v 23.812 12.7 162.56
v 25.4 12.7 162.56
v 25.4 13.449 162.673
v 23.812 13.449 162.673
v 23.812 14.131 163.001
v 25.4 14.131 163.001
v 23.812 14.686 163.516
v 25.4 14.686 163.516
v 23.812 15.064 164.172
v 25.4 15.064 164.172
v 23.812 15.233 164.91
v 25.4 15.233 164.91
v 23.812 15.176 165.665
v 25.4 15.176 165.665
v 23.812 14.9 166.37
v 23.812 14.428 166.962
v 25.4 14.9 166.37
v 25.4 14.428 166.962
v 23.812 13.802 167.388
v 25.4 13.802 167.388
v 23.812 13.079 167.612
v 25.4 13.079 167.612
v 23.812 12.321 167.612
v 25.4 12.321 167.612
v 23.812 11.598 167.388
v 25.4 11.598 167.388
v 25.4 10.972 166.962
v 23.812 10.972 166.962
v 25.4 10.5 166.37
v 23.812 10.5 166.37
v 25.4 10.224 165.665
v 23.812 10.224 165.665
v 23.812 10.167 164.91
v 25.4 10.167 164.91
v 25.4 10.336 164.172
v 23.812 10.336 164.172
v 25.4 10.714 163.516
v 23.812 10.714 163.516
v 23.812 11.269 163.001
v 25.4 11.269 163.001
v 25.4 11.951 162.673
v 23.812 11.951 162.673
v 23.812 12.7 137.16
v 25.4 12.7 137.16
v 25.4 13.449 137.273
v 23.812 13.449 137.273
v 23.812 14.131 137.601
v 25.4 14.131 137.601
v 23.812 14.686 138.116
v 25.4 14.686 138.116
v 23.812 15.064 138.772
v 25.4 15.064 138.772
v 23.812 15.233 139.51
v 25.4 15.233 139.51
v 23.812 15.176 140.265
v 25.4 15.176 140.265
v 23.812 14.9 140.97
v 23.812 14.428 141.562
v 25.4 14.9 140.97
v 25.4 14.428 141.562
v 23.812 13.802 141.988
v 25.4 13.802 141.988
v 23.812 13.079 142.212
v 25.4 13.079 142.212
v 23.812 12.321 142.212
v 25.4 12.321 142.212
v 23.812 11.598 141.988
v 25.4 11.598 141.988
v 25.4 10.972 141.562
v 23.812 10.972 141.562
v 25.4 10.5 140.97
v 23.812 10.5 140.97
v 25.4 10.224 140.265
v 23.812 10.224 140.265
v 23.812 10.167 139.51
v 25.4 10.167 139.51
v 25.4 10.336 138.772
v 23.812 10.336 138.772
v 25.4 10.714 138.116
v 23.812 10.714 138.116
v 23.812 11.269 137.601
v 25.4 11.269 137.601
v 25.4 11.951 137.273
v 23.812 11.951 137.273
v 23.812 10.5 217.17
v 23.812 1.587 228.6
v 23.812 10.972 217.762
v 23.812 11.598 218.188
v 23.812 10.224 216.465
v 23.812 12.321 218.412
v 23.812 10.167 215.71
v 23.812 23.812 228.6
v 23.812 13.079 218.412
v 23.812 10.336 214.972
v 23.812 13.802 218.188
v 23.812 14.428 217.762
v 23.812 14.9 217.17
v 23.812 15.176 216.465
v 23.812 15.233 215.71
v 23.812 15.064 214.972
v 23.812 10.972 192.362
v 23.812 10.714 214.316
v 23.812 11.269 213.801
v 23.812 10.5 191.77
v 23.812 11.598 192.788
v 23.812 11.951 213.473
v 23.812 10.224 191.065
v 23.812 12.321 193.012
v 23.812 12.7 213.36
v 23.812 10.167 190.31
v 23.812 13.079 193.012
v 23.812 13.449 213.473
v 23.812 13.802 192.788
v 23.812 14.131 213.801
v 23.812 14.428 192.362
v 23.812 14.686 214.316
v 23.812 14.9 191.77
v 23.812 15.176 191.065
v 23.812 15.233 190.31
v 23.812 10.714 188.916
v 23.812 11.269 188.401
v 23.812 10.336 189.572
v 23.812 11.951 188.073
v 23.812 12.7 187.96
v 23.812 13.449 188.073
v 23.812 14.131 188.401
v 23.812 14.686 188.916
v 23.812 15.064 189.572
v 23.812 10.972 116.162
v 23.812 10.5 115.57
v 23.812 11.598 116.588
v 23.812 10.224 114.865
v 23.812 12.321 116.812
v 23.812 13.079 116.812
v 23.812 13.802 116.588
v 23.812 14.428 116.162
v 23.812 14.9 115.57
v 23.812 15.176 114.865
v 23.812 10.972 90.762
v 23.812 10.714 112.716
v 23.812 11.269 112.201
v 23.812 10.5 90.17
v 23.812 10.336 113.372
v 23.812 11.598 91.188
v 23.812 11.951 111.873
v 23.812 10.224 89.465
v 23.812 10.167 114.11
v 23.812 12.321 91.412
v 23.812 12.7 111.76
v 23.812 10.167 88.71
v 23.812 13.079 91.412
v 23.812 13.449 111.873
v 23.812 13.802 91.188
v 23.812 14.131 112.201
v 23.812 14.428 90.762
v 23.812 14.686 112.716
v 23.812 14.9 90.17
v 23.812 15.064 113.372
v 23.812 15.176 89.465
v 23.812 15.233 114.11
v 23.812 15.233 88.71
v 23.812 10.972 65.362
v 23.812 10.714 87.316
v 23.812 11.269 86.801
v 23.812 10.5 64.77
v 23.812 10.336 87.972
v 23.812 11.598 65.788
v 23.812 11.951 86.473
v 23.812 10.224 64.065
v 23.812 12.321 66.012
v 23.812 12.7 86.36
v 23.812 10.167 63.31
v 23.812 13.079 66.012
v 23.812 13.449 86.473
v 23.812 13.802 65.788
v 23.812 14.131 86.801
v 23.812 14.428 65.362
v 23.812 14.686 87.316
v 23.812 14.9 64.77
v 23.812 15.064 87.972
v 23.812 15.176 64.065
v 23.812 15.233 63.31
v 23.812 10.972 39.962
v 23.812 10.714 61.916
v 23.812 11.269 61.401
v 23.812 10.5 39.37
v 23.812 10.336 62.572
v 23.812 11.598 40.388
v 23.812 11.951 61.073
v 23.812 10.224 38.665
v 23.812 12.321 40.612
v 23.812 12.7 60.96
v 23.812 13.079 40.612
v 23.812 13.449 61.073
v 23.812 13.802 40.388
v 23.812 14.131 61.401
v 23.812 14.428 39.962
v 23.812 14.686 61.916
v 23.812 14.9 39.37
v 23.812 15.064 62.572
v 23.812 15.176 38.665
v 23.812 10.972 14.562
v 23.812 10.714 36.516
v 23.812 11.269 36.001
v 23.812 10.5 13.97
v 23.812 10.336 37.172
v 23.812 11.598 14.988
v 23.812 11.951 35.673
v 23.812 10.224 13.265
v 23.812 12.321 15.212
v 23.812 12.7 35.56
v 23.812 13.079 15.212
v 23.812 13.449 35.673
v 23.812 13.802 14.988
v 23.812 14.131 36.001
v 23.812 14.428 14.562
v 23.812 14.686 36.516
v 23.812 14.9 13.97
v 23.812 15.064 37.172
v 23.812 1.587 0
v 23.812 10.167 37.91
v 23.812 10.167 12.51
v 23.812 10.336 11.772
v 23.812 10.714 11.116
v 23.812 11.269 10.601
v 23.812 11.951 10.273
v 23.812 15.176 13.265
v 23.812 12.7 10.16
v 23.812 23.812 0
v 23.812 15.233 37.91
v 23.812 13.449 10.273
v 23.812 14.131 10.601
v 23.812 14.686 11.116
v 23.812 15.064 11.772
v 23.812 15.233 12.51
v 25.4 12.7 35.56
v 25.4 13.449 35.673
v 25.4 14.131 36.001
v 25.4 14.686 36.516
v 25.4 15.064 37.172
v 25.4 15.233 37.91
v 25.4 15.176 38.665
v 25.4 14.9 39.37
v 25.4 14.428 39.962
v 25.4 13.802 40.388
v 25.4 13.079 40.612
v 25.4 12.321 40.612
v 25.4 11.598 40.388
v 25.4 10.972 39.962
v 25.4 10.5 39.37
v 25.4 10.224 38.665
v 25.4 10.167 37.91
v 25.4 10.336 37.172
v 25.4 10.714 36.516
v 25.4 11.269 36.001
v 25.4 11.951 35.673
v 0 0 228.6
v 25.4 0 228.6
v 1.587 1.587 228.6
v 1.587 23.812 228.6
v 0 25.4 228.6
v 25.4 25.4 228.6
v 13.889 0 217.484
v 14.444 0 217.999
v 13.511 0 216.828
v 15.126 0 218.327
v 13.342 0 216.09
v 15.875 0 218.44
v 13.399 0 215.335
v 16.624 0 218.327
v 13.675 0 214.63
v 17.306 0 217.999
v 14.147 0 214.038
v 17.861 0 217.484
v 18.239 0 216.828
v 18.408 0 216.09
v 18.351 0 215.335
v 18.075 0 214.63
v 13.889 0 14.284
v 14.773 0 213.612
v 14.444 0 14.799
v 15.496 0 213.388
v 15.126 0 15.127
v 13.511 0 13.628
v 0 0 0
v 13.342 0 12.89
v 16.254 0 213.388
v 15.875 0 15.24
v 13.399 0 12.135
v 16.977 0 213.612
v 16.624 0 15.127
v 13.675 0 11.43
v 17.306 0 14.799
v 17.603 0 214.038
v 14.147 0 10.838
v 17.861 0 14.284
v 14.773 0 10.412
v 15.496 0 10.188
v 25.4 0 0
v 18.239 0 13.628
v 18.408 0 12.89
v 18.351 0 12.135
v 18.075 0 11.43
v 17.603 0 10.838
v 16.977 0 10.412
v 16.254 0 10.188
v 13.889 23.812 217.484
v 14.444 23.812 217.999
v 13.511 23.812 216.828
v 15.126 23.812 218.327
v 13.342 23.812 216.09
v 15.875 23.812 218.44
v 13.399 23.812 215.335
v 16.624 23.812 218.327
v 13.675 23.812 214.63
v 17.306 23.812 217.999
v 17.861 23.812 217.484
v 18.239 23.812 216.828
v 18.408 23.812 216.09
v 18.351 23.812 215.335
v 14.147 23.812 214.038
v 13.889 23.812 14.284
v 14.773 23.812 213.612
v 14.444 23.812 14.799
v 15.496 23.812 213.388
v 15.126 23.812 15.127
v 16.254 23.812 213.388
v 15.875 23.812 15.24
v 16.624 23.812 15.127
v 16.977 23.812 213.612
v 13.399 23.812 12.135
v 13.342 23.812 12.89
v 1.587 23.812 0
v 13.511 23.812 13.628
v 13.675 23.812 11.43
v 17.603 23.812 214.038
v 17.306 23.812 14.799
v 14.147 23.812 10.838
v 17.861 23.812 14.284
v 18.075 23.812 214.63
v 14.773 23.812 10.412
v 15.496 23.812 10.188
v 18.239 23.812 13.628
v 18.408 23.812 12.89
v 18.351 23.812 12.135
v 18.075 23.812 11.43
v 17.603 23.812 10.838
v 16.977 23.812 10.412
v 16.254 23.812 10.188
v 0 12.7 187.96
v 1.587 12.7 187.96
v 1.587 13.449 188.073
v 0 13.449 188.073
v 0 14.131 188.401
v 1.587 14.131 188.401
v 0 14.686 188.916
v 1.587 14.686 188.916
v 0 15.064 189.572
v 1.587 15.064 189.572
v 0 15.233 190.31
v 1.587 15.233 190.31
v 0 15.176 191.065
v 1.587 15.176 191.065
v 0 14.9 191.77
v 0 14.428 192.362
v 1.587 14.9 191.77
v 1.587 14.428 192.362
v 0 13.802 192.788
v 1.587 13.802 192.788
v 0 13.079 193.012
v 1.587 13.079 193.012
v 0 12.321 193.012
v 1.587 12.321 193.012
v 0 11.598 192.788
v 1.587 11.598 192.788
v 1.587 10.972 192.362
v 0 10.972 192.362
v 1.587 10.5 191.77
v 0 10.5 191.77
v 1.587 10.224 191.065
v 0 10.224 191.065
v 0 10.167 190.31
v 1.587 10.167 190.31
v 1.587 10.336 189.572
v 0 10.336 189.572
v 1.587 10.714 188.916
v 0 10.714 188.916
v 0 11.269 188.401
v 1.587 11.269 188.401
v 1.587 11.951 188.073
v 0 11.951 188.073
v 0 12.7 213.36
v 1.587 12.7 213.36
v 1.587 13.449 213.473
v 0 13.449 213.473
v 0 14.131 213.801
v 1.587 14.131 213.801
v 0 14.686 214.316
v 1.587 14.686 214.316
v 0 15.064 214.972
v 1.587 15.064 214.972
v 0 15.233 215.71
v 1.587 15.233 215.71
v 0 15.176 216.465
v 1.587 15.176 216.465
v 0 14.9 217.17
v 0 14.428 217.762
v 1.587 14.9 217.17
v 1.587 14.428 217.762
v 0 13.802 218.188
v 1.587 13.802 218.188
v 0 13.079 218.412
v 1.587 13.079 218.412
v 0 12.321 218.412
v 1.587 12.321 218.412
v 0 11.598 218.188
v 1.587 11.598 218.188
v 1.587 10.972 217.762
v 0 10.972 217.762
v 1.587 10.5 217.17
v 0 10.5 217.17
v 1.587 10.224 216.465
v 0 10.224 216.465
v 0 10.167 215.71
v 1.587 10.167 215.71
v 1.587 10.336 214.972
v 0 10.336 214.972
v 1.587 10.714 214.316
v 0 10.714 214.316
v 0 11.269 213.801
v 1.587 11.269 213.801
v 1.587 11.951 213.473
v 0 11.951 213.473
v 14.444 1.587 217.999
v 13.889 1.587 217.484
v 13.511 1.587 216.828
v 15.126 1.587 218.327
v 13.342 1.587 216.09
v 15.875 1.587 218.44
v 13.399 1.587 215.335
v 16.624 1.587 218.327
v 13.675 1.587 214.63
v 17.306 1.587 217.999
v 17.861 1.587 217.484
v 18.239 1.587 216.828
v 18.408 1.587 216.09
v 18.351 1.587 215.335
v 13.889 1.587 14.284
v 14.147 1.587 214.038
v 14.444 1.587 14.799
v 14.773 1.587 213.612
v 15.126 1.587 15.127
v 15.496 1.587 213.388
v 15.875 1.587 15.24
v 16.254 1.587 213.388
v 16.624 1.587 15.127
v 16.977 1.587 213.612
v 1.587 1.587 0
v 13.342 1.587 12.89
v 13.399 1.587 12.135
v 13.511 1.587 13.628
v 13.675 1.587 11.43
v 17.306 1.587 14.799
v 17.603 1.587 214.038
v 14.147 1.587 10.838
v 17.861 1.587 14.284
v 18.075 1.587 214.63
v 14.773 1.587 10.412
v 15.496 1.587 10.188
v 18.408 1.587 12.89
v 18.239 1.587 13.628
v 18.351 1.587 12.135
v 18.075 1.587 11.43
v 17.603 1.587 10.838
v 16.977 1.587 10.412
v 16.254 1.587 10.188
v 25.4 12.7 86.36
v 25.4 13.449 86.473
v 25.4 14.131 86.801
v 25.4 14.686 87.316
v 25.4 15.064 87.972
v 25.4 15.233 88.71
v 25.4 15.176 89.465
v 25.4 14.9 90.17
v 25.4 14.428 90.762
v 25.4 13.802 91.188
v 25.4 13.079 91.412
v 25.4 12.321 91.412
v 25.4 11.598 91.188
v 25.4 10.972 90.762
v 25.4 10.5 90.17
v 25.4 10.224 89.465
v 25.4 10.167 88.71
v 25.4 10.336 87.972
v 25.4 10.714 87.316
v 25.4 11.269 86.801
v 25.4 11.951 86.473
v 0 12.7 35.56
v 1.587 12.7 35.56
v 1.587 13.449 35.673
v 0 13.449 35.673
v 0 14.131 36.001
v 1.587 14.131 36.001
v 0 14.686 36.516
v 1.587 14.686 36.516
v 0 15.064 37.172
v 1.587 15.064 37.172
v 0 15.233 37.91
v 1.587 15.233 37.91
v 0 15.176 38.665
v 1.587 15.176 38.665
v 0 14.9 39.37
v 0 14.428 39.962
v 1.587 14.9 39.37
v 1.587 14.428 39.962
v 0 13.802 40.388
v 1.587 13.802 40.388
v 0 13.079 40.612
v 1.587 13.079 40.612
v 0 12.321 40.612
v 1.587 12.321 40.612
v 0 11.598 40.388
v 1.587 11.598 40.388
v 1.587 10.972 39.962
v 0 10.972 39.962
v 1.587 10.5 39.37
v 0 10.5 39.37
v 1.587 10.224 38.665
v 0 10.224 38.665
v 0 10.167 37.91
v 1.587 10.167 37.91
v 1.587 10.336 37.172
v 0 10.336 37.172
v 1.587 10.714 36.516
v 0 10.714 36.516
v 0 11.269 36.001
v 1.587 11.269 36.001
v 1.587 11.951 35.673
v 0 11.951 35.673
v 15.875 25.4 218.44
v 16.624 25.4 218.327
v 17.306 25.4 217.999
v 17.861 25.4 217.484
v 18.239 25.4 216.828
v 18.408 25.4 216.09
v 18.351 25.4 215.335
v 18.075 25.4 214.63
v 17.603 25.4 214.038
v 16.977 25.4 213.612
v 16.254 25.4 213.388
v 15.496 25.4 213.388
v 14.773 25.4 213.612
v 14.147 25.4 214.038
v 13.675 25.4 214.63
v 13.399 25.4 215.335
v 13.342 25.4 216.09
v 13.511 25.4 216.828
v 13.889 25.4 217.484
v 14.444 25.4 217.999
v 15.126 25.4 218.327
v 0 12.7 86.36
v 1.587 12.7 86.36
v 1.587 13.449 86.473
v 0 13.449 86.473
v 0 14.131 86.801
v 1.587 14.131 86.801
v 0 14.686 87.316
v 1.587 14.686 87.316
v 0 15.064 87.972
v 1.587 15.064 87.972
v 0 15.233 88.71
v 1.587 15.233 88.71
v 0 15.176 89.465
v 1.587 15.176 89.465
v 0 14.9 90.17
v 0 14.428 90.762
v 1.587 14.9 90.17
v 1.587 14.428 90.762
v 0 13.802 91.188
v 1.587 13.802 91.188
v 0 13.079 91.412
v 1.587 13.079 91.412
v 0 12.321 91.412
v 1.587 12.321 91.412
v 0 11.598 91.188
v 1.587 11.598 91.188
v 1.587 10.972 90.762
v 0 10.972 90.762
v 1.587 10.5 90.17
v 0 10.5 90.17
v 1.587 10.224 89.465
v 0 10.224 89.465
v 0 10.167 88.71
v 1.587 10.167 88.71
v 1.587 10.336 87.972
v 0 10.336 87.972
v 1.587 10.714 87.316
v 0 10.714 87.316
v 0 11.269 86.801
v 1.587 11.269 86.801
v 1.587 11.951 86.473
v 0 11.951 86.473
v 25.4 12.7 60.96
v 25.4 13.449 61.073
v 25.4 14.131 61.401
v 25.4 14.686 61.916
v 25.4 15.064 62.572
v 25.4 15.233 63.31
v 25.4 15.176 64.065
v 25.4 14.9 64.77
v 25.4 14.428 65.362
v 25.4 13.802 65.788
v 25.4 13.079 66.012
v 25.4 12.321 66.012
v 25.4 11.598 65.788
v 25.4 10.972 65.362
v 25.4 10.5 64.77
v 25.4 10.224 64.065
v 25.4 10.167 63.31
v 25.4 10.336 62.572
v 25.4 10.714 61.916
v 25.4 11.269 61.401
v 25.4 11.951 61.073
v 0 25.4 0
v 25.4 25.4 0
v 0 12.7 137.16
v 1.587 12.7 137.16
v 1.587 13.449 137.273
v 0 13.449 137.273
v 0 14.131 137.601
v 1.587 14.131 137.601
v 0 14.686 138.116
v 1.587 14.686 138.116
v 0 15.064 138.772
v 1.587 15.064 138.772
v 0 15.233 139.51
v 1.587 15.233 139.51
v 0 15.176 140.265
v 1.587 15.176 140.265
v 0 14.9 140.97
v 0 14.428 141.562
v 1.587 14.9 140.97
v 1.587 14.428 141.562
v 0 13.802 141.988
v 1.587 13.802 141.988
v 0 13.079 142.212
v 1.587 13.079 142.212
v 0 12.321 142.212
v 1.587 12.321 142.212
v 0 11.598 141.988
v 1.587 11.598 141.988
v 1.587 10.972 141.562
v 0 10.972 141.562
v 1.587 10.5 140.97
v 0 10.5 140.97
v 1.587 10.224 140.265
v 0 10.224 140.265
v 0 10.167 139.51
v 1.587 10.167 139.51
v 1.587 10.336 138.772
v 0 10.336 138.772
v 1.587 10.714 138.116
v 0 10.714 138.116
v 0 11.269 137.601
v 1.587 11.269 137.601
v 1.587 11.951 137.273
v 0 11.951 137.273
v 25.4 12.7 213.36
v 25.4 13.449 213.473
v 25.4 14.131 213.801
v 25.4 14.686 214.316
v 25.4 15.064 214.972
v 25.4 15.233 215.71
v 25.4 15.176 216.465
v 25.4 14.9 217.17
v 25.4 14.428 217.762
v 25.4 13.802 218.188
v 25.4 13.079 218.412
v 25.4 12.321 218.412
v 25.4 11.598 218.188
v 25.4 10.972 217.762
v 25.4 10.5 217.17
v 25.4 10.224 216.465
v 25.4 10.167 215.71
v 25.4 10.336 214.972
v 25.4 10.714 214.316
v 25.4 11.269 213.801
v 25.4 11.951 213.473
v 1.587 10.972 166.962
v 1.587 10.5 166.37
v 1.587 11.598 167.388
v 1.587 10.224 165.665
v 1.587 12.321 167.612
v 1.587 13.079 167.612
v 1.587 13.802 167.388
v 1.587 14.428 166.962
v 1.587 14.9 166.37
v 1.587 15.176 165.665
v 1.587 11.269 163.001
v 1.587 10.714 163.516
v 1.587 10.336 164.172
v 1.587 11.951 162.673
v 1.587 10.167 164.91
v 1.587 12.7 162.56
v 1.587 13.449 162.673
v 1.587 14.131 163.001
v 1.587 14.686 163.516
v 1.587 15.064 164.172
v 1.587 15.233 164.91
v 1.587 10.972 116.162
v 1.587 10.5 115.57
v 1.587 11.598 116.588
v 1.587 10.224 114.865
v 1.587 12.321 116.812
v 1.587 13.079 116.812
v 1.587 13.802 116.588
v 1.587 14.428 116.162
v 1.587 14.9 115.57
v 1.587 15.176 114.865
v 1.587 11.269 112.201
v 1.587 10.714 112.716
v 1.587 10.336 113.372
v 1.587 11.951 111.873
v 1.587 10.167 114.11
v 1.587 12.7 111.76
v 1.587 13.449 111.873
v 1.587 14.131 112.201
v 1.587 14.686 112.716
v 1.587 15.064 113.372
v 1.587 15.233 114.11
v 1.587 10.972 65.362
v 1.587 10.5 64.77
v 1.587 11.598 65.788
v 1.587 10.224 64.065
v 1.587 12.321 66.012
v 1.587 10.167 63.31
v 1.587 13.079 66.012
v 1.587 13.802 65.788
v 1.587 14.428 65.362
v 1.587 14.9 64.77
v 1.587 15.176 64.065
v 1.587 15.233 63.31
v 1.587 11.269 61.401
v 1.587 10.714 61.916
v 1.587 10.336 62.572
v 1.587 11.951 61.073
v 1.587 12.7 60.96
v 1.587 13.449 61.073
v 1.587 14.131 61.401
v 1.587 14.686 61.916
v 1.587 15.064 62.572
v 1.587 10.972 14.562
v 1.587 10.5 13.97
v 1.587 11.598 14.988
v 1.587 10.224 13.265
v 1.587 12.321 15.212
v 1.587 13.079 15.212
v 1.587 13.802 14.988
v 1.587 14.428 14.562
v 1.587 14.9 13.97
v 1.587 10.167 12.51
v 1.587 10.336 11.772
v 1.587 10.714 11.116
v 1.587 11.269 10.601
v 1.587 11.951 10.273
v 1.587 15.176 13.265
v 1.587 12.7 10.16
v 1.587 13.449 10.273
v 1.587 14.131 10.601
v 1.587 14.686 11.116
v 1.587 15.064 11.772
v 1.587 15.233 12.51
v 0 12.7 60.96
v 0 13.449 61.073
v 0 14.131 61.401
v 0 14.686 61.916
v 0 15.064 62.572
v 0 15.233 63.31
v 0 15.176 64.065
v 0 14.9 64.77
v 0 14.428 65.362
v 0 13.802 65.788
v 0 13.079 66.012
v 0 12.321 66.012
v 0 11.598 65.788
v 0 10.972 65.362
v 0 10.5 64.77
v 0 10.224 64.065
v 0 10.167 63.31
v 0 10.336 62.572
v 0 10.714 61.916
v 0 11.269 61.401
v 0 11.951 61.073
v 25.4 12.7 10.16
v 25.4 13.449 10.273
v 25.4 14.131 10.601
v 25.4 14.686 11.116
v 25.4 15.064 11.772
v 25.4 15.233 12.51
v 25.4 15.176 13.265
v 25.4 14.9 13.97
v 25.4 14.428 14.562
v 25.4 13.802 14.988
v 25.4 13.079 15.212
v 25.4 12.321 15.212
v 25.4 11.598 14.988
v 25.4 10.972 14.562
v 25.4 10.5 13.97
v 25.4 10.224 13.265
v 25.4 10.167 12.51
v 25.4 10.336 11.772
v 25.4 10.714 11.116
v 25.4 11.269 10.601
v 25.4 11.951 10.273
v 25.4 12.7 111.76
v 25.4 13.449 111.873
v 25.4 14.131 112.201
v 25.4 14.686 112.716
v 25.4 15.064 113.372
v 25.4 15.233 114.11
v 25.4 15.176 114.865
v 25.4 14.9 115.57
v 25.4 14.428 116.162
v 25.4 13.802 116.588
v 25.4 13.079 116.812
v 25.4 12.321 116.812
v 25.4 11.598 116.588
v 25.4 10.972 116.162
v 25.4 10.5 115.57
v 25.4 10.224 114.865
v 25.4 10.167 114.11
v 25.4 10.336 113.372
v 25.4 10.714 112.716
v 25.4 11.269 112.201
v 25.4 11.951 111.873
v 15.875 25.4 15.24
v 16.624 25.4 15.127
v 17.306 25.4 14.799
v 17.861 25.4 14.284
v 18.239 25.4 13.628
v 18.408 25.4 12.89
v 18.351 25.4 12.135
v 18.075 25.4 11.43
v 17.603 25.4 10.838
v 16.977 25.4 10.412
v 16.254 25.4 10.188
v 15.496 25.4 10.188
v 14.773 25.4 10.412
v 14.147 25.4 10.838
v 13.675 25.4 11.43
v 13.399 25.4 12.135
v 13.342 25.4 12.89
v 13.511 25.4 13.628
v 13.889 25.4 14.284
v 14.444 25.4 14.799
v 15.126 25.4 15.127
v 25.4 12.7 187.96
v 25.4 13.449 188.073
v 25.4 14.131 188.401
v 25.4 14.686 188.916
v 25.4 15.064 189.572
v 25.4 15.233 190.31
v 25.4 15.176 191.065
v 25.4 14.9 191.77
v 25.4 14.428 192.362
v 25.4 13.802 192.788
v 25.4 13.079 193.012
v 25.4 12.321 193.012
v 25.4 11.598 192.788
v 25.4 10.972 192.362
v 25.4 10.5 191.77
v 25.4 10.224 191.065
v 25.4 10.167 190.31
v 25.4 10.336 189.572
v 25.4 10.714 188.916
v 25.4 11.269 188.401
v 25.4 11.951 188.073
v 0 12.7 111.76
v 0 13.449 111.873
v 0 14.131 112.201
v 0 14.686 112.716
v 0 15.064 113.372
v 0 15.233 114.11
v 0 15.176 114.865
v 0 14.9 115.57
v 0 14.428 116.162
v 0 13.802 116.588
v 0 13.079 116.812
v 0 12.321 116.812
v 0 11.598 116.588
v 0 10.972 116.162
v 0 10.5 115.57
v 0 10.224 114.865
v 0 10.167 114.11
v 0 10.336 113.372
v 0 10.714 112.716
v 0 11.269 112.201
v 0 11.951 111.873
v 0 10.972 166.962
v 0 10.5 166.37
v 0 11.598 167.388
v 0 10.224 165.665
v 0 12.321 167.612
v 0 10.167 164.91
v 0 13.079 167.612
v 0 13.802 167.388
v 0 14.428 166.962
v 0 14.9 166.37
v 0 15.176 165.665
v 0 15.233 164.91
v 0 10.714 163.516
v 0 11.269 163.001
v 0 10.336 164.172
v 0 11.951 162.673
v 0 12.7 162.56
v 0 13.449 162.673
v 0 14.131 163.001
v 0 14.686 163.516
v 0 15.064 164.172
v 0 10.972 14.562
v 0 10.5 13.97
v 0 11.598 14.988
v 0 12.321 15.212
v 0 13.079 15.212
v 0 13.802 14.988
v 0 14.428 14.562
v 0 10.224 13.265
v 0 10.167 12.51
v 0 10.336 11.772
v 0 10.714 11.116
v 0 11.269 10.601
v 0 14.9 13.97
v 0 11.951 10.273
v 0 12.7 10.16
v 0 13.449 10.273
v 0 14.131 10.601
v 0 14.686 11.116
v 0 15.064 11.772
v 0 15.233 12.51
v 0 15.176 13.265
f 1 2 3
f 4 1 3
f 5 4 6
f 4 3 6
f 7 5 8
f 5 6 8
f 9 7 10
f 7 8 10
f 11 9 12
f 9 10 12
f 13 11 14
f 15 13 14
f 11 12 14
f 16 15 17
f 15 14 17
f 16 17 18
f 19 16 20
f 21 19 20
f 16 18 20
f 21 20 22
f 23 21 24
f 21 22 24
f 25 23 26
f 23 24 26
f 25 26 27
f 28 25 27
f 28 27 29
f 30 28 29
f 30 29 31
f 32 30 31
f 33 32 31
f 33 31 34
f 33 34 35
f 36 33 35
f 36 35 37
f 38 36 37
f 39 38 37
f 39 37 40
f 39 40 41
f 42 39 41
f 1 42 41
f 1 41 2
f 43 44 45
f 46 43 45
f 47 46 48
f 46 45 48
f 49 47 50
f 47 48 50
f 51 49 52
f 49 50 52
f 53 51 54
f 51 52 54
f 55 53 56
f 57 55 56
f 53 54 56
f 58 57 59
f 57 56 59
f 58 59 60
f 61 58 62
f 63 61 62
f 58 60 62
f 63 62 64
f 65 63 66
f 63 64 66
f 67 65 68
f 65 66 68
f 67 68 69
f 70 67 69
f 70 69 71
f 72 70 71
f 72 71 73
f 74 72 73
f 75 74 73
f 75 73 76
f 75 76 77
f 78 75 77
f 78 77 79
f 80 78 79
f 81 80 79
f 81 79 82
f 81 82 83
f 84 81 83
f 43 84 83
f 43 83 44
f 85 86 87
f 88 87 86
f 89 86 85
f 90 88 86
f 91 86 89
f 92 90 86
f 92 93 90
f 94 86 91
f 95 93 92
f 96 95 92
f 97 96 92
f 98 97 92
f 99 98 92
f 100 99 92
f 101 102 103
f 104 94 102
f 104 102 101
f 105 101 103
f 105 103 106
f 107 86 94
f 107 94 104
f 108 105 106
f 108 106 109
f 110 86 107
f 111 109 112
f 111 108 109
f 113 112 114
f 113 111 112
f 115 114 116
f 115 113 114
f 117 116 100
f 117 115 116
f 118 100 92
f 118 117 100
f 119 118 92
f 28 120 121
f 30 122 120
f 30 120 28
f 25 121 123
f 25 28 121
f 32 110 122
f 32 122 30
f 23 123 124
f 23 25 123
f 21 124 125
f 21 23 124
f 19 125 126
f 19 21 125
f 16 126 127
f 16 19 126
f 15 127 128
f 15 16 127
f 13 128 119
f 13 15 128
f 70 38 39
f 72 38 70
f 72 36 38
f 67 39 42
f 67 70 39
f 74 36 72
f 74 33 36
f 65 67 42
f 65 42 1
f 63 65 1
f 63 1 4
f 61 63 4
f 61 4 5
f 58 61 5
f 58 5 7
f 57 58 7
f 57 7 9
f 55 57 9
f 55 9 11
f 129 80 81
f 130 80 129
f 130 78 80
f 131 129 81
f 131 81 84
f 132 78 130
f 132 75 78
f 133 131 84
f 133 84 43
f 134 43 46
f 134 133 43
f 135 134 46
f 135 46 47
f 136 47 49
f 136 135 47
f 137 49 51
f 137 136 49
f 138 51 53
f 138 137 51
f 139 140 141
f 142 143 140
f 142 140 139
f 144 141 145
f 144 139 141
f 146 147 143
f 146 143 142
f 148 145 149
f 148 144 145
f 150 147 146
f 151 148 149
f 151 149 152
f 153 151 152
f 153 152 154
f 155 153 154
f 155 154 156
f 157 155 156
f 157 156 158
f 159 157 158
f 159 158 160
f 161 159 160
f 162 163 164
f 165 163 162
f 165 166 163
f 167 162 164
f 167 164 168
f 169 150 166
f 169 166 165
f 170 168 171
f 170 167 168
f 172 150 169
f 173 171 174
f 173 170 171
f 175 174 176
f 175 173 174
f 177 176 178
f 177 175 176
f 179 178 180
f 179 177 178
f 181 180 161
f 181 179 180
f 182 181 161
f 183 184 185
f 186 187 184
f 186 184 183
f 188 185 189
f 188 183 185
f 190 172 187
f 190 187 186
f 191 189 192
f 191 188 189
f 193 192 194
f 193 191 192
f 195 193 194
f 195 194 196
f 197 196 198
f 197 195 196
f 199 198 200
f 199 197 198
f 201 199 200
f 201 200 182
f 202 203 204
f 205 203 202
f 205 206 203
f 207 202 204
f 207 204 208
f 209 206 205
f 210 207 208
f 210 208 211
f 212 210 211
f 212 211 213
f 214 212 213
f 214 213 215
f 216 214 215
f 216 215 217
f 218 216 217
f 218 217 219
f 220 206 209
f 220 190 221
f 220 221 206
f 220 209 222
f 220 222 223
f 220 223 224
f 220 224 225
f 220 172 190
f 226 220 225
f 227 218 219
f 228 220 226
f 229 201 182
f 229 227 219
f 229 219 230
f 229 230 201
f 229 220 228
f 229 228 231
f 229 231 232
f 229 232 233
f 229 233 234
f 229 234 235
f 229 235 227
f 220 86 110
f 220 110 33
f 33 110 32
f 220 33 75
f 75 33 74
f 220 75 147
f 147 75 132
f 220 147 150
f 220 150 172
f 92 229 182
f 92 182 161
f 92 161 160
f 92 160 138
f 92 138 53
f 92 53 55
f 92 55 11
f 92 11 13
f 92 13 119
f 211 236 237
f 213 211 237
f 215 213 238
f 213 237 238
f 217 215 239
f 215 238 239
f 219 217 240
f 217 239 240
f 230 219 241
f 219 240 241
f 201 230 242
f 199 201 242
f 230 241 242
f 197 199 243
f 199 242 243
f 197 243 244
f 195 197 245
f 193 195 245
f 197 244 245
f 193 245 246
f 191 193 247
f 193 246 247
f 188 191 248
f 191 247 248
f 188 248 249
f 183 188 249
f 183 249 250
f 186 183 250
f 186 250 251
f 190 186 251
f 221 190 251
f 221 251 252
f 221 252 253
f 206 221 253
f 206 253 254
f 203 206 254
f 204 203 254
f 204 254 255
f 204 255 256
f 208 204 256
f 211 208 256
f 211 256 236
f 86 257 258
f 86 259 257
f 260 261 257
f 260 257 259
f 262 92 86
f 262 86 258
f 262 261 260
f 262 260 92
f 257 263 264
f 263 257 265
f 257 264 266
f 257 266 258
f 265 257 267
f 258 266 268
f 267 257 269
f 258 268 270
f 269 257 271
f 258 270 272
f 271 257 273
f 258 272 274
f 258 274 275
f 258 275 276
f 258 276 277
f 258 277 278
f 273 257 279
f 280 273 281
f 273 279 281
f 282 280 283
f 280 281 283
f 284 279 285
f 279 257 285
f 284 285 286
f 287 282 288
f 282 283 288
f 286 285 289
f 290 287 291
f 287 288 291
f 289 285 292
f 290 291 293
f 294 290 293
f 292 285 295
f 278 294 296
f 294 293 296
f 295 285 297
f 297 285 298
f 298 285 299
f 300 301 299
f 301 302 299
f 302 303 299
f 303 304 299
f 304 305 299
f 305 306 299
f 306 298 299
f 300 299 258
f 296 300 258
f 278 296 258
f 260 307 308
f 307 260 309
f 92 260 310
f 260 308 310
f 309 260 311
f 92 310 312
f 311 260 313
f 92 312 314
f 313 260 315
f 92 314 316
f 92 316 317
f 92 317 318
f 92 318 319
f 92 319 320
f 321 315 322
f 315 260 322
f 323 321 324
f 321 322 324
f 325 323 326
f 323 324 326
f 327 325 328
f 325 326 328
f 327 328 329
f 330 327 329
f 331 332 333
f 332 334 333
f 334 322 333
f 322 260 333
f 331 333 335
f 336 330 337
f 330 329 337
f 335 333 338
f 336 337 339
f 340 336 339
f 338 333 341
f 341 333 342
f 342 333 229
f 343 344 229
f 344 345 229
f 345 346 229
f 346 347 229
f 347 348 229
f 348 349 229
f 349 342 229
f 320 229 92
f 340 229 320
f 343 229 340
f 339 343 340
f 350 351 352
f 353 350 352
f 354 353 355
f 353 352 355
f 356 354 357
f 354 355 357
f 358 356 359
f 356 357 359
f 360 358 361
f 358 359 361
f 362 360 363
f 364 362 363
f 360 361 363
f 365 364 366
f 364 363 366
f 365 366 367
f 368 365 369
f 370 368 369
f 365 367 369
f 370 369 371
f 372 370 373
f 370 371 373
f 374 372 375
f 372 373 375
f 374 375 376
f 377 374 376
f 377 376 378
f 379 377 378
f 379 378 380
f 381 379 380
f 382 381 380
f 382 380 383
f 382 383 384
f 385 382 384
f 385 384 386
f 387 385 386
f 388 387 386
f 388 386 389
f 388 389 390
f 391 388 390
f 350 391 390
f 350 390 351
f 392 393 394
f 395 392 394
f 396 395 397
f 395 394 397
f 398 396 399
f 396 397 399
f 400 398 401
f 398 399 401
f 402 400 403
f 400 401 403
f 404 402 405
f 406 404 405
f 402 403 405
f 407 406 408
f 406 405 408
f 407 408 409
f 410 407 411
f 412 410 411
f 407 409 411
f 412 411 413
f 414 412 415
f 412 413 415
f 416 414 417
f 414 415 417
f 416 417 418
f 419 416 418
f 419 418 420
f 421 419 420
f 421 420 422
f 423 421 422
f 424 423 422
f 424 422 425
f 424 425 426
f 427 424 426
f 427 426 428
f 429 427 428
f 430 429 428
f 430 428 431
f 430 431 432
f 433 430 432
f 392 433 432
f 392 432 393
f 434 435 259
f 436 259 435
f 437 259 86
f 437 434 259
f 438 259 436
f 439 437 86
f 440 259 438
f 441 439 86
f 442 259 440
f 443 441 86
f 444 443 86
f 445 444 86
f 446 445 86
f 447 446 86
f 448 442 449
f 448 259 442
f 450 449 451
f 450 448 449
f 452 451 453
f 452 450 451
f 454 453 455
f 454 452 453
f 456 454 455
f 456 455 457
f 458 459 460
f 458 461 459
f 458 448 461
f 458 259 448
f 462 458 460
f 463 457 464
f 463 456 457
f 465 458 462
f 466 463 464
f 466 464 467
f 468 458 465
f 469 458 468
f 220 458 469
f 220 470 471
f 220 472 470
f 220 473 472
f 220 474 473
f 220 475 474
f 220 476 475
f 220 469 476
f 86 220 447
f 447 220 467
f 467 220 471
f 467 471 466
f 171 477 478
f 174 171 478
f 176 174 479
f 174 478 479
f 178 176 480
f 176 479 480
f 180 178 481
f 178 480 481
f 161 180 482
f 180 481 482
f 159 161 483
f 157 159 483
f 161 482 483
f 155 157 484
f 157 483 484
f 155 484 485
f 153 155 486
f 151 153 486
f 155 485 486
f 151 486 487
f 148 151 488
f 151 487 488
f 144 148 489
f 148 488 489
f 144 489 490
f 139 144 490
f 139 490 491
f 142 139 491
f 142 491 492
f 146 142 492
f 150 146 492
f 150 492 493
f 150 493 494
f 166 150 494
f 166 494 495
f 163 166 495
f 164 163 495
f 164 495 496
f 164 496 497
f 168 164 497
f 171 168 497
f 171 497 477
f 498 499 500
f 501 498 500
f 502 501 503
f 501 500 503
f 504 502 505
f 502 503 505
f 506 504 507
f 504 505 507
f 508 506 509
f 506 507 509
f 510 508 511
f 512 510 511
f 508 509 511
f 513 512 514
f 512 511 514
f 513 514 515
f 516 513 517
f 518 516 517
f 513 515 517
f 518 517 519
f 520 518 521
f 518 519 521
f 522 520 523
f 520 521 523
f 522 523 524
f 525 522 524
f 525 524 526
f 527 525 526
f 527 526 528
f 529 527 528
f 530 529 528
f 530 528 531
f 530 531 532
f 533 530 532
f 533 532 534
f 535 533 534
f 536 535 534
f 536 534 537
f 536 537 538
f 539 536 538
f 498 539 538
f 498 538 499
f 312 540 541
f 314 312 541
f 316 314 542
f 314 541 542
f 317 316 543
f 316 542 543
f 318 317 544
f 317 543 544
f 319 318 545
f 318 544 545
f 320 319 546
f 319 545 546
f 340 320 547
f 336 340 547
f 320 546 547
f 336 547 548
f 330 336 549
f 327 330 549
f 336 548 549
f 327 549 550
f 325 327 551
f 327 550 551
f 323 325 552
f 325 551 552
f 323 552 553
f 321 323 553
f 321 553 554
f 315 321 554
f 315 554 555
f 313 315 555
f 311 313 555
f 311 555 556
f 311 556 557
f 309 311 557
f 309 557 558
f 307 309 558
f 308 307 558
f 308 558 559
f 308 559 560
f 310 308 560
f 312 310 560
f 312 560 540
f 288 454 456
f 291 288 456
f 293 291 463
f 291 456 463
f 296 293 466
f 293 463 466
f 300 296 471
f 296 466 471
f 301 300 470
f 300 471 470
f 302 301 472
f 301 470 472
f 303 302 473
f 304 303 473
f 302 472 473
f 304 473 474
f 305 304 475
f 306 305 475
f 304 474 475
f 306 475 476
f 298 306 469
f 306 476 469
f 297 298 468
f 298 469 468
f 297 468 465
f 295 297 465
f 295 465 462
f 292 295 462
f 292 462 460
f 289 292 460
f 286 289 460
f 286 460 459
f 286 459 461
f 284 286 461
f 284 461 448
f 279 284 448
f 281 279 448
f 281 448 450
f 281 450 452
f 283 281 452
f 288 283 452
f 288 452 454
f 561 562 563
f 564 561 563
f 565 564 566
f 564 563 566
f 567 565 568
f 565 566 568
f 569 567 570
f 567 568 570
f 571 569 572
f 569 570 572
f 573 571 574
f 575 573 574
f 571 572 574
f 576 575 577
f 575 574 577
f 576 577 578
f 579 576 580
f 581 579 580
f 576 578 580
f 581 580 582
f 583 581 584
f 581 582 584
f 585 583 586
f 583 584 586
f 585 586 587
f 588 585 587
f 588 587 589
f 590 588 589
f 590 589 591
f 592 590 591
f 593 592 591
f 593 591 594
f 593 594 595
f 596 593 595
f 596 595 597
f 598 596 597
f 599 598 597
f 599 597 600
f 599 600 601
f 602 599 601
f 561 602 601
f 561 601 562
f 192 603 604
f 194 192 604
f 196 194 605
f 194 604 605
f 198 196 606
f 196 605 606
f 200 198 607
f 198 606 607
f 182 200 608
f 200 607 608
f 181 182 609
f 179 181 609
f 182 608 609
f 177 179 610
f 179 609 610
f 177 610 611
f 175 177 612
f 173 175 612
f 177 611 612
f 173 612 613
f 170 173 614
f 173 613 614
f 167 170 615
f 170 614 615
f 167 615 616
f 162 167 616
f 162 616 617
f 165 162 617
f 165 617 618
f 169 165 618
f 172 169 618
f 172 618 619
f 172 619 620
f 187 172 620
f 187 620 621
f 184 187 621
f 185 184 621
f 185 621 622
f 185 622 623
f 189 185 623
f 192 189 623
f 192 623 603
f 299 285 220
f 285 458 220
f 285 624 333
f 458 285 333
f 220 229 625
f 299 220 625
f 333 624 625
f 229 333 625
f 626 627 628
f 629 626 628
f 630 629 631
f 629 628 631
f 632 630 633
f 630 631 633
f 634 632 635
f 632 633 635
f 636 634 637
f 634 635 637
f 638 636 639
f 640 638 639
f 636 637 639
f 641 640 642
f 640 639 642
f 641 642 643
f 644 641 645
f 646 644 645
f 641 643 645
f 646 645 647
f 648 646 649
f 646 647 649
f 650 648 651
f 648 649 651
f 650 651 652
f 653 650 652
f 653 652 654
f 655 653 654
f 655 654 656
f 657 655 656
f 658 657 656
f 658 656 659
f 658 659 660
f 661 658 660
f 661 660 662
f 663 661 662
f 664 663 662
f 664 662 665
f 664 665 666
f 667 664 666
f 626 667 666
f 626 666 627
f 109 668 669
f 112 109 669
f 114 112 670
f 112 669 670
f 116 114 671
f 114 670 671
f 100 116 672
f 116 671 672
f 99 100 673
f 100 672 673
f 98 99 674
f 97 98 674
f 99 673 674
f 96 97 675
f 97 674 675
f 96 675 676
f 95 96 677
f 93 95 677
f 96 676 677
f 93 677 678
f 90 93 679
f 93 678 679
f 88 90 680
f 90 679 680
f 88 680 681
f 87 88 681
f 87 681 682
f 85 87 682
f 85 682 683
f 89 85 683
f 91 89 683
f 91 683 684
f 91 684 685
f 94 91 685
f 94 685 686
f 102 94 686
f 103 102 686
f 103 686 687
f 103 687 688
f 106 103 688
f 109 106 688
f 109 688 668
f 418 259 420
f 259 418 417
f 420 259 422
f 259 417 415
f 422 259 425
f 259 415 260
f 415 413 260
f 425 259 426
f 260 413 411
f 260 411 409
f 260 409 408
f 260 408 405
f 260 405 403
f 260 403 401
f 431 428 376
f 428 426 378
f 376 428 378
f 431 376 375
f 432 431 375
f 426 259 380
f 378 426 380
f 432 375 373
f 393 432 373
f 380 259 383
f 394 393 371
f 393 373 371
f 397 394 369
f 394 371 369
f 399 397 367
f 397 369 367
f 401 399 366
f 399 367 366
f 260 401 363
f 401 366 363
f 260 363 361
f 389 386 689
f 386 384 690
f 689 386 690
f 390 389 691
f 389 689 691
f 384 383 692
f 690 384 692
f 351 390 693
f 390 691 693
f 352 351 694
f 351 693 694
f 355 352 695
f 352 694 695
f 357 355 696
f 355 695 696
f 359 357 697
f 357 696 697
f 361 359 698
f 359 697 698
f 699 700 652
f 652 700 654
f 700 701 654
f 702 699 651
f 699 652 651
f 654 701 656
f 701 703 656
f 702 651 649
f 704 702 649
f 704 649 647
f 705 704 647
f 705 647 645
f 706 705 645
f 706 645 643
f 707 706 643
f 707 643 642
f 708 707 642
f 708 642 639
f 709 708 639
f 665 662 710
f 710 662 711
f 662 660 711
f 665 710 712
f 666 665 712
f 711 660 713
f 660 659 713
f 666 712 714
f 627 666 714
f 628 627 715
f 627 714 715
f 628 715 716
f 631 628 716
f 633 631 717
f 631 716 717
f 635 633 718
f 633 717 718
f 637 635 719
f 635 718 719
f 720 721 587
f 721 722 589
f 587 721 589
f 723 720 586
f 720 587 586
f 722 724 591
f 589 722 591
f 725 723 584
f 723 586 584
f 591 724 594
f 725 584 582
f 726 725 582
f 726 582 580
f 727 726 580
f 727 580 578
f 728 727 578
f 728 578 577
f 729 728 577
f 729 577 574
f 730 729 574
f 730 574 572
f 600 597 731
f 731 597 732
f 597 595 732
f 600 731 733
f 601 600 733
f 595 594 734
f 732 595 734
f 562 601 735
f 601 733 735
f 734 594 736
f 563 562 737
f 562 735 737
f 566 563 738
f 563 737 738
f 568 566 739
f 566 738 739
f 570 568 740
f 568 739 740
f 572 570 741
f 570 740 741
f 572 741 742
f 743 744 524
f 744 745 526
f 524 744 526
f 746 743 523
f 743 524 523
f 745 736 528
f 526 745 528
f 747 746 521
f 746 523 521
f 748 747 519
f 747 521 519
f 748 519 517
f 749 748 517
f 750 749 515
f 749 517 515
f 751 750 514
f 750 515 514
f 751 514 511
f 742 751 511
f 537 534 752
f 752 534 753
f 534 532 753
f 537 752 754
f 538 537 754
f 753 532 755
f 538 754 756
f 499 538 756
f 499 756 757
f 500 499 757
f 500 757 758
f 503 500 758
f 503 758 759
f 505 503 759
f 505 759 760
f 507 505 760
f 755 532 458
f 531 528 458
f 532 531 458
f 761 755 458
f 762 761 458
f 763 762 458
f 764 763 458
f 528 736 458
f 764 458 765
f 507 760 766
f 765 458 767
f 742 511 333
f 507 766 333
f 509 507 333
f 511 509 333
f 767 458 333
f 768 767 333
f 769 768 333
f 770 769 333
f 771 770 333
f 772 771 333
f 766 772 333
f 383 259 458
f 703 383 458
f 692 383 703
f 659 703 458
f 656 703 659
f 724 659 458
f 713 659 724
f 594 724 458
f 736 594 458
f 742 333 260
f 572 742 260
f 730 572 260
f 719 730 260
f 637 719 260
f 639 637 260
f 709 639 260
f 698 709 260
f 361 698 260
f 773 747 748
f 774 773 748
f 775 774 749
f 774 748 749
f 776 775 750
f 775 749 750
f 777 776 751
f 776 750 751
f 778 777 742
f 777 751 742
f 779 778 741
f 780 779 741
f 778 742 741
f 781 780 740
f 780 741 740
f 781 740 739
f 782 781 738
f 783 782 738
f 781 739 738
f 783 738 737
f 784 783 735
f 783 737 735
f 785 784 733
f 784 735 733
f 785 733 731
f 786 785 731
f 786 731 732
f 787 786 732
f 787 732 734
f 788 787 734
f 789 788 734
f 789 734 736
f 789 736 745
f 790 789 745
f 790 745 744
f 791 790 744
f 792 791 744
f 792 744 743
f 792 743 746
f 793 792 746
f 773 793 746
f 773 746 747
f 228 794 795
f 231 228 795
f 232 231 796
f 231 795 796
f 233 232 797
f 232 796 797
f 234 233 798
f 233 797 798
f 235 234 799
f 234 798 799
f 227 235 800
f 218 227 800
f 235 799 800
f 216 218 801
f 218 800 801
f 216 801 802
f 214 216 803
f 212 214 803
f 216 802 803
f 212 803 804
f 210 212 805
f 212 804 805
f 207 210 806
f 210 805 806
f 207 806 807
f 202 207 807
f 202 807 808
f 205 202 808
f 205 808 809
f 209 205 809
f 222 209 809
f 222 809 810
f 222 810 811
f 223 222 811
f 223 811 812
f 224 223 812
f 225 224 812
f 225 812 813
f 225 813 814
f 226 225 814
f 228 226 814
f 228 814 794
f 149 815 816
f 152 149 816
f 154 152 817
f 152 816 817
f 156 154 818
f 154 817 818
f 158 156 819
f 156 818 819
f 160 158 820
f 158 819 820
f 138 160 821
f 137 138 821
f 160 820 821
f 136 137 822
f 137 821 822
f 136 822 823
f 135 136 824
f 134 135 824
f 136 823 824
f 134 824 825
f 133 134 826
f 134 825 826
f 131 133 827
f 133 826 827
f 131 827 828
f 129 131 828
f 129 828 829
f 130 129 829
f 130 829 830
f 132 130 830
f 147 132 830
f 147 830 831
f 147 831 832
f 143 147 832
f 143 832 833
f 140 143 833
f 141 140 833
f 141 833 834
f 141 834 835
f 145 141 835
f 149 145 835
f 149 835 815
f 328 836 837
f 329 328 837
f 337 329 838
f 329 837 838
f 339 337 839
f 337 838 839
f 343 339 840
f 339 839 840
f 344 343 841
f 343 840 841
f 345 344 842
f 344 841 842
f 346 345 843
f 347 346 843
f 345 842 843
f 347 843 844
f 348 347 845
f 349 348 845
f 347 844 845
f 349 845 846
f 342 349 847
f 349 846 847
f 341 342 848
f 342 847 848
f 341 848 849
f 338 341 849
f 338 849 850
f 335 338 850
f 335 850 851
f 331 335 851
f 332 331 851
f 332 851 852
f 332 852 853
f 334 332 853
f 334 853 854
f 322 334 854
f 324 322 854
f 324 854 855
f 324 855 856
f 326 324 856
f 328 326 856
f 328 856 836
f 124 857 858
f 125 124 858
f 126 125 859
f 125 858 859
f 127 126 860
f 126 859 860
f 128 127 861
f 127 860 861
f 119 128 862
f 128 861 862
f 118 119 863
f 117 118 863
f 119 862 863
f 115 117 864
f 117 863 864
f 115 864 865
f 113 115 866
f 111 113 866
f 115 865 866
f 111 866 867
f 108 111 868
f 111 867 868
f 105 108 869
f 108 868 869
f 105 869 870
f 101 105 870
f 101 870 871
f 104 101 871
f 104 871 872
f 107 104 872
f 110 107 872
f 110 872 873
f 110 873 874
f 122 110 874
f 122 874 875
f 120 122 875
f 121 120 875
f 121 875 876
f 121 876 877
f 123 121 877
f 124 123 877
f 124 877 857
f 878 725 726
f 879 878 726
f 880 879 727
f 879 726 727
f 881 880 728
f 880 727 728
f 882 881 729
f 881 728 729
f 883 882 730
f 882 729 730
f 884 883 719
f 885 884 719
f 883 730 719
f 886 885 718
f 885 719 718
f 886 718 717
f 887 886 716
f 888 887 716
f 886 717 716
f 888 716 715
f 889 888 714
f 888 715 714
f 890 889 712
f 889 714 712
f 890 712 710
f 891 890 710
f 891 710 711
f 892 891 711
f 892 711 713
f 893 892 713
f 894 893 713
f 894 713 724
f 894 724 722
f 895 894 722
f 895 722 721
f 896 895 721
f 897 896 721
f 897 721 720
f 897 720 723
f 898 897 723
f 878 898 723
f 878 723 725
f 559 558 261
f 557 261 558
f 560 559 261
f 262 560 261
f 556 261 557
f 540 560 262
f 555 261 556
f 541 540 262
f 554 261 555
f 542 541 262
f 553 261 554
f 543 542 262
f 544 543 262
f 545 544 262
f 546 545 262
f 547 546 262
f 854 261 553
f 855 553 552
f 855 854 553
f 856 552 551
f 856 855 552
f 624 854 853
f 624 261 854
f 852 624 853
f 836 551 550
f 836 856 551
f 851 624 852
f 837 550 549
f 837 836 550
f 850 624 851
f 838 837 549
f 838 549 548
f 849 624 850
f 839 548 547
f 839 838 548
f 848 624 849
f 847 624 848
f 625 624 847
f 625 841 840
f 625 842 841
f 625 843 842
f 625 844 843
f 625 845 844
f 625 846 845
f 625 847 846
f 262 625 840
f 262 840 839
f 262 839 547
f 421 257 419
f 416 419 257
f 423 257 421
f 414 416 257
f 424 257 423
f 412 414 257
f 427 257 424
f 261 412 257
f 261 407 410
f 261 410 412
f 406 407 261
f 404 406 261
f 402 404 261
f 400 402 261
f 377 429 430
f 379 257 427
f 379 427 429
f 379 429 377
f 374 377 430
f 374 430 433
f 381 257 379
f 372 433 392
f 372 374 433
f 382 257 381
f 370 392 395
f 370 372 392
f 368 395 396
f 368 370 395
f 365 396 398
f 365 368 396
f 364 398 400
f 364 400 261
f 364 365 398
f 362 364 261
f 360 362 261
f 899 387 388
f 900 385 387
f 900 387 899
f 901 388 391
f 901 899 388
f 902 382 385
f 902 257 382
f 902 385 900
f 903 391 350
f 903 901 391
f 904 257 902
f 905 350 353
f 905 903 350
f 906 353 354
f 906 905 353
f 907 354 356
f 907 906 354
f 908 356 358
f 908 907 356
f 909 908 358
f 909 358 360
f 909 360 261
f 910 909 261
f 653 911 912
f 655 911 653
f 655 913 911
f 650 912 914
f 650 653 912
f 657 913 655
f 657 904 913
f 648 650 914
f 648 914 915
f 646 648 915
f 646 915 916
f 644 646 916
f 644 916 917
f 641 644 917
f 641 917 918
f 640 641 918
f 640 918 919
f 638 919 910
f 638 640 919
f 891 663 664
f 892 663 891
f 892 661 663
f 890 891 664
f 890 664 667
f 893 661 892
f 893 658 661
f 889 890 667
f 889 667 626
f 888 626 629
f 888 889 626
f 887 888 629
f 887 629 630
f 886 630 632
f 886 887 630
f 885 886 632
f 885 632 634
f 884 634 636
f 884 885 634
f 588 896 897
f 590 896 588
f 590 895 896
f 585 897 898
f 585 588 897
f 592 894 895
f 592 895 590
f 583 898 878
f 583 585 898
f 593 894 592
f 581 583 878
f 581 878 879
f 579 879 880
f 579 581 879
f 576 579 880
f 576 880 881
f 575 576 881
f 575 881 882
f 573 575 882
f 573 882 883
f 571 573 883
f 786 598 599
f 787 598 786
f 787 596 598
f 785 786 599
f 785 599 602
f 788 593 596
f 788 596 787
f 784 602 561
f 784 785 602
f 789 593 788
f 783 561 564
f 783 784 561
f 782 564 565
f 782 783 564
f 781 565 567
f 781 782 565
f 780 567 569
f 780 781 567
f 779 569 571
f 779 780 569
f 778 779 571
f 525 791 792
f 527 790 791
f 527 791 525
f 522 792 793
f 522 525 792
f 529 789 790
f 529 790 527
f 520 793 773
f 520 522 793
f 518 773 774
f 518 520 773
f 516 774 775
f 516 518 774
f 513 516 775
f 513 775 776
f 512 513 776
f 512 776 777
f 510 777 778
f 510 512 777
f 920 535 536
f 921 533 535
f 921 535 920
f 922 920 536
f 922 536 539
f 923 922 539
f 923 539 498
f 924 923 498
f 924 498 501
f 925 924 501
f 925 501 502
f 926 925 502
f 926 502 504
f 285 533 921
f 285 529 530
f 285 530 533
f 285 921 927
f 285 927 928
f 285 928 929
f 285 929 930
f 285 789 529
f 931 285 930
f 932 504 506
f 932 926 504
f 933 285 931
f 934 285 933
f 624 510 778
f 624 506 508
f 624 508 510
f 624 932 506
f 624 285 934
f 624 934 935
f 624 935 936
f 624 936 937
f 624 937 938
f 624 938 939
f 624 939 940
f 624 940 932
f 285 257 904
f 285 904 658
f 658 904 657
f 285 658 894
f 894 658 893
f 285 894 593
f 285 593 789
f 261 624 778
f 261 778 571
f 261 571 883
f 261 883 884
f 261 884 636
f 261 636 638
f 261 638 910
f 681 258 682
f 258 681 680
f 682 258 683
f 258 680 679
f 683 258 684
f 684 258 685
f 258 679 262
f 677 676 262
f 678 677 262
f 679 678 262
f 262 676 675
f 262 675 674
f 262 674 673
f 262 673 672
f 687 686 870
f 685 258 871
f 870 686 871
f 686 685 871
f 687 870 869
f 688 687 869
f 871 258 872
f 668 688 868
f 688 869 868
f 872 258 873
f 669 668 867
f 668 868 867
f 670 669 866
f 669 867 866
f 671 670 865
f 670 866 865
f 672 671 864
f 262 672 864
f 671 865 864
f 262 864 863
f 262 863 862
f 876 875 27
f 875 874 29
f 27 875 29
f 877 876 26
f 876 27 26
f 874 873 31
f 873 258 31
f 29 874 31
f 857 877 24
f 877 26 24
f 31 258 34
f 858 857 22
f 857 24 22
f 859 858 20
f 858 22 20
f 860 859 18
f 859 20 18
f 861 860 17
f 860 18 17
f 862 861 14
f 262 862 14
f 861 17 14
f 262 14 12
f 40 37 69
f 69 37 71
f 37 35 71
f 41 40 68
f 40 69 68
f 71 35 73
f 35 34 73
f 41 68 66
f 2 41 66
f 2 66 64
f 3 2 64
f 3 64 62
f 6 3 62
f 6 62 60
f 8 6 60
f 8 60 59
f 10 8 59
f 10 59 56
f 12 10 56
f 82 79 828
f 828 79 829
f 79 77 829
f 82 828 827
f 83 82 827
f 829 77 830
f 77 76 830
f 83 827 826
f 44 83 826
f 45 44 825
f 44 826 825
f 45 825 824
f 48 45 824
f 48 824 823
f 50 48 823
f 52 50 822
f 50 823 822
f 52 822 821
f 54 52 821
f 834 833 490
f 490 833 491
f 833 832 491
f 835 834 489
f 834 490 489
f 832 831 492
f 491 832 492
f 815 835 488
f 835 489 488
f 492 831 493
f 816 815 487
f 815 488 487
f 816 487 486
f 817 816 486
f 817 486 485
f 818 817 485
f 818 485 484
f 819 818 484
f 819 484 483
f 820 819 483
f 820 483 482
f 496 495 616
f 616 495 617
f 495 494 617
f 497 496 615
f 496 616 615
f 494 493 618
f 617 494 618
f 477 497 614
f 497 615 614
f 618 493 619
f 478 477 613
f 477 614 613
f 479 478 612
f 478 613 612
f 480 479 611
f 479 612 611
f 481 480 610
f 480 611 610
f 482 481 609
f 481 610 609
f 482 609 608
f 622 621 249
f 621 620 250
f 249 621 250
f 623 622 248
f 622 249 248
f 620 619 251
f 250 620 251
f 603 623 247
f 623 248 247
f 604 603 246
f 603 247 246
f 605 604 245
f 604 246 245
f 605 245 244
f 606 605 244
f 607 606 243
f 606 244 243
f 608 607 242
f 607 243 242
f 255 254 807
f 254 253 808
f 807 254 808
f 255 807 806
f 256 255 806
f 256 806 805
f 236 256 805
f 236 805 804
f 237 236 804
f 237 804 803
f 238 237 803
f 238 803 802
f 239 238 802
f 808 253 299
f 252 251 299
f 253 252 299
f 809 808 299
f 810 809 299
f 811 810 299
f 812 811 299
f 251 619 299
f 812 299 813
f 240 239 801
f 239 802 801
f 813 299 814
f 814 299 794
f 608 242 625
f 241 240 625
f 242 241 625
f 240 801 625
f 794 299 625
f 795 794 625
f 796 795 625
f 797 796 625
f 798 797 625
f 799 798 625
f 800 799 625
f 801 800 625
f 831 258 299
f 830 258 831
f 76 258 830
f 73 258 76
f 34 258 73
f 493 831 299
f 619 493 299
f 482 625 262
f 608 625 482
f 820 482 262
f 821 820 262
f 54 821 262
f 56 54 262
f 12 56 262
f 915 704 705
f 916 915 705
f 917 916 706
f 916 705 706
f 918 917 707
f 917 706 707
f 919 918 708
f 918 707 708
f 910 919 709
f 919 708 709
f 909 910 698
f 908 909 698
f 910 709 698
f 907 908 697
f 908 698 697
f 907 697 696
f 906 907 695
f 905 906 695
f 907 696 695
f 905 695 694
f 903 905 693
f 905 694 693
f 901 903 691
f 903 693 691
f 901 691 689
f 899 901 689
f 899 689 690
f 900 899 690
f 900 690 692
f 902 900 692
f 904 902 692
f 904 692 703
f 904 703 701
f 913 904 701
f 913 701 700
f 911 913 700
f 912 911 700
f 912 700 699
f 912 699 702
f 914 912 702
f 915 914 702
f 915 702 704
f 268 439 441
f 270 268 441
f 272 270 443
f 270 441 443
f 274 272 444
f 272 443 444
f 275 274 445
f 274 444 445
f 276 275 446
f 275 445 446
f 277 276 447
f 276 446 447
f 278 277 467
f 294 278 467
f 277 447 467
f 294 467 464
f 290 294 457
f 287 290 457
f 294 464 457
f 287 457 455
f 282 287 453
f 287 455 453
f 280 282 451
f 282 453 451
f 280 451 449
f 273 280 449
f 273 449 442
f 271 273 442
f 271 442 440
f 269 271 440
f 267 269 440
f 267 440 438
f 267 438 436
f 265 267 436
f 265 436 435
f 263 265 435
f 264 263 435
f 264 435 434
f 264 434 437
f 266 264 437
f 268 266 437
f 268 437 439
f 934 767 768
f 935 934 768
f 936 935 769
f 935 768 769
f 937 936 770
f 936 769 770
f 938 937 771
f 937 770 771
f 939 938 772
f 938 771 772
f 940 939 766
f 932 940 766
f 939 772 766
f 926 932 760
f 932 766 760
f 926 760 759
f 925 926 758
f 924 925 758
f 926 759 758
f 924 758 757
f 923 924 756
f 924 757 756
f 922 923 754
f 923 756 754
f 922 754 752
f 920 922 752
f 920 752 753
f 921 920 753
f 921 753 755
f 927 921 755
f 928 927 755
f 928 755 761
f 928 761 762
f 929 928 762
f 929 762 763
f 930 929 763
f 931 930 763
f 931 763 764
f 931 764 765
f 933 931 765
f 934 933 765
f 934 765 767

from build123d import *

# Parameters (mm, degrees)
SKETCH1_W           = 25.4
SKETCH1_H           = 25.4
SKETCH1_W_2         = 22.225
SKETCH1_H_2         = 22.225
BOSS_EXTRUDE1_DEPTH = 228.6
SKETCH3_R           = 2.54
CUT_EXTRUDE2_DEPTH  = 232.40501291
SKETCH4_R           = 2.54
CUT_EXTRUDE3_DEPTH  = 232.40501291


with BuildPart() as part:
    # Sketch1 → Boss-Extrude1 (new body)
    with BuildSketch(Plane.XY):
        with Locations((12.7, 12.7)):
            Rectangle(SKETCH1_W, SKETCH1_H)
        with Locations((12.7, 12.7)):
            Rectangle(SKETCH1_W_2, SKETCH1_H_2, mode=Mode.SUBTRACT)
    extrude(amount=BOSS_EXTRUDE1_DEPTH)

    # Sketch3 → Cut-Extrude2 (cut, through all)
    with BuildSketch(Plane(origin=(0, 25.4, 0), x_dir=(1, 0, 0), z_dir=(0, 1, 0))):
        with Locations(Location((15.875, -215.9, 0), (0, 0, 270))):
            Circle(SKETCH3_R)
        with Locations(Location((15.875, -12.7, 0), (0, 0, 270))):
            Circle(SKETCH3_R)
    extrude(amount=-CUT_EXTRUDE2_DEPTH, mode=Mode.SUBTRACT)

    # Sketch4 → Cut-Extrude3 (cut, through all)
    with BuildSketch(Plane(origin=(25.4, 0, 0), x_dir=(0, 0, -1), z_dir=(1, 0, 0))):
        with Locations((-215.9, 12.7)):
            Circle(SKETCH4_R)
        with Locations((-190.5, 12.7)):
            Circle(SKETCH4_R)
        with Locations((-165.1, 12.7)):
            Circle(SKETCH4_R)
        with Locations((-139.7, 12.7)):
            Circle(SKETCH4_R)
        with Locations((-114.3, 12.7)):
            Circle(SKETCH4_R)
        with Locations((-88.9, 12.7)):
            Circle(SKETCH4_R)
        with Locations((-63.5, 12.7)):
            Circle(SKETCH4_R)
        with Locations((-38.1, 12.7)):
            Circle(SKETCH4_R)
        with Locations((-12.7, 12.7)):
            Circle(SKETCH4_R)
    extrude(amount=-CUT_EXTRUDE3_DEPTH, mode=Mode.SUBTRACT)


solid = part.part
